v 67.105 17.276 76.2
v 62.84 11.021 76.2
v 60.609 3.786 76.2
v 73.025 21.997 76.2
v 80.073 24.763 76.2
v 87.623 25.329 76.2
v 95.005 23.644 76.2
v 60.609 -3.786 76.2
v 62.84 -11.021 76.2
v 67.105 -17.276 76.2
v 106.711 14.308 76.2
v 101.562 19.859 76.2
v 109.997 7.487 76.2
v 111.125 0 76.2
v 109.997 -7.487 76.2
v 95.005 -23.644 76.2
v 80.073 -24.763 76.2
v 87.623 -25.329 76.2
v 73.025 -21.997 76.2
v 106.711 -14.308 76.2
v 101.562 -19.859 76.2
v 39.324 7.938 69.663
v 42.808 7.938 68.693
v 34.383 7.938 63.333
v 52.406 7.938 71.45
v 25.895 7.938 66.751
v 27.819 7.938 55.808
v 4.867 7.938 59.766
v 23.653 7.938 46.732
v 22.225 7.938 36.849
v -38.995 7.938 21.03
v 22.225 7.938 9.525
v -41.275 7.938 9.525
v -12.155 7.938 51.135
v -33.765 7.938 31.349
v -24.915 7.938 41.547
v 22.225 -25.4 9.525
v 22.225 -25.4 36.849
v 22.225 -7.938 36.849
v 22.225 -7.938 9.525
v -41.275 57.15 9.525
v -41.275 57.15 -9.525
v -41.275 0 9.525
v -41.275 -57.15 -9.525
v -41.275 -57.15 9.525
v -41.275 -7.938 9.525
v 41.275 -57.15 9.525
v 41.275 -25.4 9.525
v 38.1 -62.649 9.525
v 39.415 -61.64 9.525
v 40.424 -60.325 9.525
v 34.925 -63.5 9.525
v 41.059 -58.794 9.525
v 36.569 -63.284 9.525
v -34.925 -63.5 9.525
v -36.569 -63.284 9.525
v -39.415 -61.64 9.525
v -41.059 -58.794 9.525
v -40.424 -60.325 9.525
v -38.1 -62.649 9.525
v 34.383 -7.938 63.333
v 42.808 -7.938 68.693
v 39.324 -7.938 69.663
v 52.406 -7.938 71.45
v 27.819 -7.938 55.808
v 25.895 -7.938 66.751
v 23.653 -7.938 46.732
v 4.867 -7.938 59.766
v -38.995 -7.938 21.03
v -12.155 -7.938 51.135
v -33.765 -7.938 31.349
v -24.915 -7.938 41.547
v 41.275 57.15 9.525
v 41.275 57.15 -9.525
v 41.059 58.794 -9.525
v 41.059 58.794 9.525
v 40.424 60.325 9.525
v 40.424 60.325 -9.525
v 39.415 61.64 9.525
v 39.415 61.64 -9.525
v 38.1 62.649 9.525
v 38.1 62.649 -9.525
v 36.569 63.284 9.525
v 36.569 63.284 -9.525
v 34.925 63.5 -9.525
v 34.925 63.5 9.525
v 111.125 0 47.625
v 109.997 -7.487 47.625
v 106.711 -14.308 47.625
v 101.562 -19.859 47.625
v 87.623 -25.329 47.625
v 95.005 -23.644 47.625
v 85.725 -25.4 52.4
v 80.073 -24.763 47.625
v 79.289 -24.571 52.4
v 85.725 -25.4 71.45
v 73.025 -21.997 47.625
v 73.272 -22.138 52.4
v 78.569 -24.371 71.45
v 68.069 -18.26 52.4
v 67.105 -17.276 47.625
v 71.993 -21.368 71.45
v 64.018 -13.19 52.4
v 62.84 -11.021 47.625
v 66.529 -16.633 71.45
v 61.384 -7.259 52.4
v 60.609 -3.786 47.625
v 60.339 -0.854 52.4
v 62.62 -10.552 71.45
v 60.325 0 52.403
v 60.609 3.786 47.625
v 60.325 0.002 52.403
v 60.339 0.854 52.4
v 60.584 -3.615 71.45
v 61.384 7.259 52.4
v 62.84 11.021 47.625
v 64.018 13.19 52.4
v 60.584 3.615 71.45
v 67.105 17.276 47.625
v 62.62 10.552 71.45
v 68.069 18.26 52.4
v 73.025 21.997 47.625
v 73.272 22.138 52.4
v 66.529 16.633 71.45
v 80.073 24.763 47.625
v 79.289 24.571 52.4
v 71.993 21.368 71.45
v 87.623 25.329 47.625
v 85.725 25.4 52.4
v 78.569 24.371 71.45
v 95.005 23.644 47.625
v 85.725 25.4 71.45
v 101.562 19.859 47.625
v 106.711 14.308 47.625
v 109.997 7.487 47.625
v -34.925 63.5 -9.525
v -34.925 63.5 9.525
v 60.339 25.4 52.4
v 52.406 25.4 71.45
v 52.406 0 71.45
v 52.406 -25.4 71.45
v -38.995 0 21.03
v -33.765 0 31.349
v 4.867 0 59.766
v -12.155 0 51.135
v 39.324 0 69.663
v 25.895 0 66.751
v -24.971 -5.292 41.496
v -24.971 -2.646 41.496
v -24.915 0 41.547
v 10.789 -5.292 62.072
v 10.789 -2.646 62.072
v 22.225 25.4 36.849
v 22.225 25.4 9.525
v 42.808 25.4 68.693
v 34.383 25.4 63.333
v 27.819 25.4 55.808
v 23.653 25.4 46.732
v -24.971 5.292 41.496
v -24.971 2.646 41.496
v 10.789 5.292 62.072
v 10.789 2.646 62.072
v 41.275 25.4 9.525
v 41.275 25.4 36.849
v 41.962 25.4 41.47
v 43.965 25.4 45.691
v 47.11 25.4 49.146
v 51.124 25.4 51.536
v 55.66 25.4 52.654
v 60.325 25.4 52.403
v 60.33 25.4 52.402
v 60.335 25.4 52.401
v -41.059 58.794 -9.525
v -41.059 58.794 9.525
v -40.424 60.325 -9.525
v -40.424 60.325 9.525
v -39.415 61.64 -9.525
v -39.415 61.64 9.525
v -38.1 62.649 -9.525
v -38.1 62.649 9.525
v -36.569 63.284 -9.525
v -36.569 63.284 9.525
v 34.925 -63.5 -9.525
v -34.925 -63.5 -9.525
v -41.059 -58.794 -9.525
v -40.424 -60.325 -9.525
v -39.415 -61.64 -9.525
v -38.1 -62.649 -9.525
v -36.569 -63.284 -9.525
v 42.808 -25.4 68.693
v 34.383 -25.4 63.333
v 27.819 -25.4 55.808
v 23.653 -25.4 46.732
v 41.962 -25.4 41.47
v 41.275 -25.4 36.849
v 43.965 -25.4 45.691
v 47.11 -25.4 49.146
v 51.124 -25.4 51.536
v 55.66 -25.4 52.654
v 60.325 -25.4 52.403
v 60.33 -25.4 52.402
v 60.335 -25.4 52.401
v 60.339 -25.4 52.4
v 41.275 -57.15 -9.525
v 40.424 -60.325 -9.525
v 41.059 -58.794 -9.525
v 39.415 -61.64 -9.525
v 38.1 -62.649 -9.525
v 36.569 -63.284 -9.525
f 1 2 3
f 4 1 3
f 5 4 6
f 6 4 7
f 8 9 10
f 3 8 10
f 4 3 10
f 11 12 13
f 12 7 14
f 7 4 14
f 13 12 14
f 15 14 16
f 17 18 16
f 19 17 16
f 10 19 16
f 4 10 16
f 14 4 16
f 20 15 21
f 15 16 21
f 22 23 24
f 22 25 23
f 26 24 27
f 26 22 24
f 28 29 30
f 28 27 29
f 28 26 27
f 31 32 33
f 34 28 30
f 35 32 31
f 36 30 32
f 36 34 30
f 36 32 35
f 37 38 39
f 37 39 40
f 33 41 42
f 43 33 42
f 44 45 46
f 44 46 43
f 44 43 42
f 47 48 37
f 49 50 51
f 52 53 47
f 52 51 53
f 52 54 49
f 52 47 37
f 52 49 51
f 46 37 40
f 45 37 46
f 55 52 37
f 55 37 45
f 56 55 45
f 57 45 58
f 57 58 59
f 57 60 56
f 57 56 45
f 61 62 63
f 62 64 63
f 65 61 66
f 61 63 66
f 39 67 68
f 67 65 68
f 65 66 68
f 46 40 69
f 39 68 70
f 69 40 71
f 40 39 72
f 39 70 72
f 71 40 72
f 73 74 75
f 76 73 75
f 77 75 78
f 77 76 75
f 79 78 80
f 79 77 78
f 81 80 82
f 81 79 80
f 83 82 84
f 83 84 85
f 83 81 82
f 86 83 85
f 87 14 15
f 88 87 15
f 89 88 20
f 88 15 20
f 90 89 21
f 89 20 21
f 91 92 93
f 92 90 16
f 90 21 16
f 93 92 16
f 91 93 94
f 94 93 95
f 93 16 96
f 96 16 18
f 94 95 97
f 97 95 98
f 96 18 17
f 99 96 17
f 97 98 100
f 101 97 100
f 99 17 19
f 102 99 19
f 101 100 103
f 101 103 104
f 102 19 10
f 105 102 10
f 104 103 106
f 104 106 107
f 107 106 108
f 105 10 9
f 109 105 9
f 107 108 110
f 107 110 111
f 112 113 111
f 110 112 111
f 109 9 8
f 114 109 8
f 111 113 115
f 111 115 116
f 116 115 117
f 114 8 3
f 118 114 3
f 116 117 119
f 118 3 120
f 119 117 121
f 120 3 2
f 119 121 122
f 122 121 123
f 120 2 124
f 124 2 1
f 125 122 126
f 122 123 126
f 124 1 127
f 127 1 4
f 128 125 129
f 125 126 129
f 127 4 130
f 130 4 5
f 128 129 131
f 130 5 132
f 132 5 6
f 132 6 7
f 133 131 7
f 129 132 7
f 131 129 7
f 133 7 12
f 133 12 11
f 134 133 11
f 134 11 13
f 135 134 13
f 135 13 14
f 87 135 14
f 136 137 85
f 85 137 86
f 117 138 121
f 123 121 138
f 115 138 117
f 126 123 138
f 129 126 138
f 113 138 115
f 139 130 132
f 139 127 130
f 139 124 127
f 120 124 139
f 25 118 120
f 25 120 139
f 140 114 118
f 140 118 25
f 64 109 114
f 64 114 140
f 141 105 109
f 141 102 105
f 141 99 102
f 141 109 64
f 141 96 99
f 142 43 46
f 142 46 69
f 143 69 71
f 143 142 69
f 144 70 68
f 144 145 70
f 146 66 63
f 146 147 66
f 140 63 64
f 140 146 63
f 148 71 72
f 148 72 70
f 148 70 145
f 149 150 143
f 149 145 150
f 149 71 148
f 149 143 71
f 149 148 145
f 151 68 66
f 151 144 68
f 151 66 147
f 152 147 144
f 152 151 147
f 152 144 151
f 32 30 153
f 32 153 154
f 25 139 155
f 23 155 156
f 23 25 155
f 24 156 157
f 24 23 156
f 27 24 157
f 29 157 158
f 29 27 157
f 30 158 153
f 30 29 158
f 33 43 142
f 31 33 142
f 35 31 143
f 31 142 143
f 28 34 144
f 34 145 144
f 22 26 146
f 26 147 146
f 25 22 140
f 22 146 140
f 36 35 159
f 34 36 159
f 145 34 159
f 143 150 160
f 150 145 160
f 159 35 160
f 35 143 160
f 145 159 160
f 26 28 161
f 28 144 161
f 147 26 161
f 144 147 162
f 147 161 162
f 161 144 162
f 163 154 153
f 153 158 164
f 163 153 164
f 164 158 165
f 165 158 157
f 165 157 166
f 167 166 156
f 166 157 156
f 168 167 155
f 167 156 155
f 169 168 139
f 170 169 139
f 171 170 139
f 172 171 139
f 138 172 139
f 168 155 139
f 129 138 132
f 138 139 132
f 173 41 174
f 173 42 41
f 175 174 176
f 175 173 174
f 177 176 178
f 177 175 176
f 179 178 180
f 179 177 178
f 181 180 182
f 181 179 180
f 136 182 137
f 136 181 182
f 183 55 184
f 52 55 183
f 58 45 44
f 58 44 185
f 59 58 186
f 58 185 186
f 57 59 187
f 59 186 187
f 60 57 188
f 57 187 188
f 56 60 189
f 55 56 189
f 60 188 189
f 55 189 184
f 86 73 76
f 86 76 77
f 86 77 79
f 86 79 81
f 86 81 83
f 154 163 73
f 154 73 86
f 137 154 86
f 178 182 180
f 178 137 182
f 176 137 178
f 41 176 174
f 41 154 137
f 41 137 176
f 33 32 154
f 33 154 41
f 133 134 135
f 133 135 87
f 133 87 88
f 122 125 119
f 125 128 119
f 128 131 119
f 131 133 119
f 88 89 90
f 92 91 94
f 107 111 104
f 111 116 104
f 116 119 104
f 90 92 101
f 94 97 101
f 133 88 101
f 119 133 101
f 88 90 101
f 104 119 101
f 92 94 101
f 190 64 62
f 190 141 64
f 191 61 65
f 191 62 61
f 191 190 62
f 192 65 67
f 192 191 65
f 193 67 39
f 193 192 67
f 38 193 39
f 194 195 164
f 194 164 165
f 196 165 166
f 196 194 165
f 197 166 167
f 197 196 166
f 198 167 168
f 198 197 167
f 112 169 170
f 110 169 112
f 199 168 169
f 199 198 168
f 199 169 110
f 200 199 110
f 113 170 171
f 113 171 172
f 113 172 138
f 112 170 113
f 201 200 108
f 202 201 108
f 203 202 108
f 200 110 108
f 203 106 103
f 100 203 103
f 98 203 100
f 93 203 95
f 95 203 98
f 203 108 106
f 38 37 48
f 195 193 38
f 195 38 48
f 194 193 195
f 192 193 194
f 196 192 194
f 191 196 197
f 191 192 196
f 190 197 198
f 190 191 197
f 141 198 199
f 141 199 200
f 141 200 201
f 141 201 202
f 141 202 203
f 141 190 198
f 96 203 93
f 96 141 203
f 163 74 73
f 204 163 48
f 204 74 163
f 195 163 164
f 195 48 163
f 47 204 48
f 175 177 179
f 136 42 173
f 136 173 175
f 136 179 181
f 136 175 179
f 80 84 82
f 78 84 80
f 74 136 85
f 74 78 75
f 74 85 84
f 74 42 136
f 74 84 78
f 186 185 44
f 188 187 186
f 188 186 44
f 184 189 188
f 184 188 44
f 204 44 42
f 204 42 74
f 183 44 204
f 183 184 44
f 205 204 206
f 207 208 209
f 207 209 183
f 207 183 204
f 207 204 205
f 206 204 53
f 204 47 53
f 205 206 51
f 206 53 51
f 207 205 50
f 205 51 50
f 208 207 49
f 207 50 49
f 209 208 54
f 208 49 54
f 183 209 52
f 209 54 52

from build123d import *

# Parameters (mm, degrees)
F1_DEPTH = 63.5
F2_DEPTH = 25.4
F3_DEPTH = 7.9375
F4_DEPTH = 25.4
F6_R     = 6.35


with BuildPart() as f1:
    # F0 (on Front) → F1 (new body, symmetric)
    with BuildSketch(Plane.XZ):
        Polygon((-41.275, 9.525), (-41.275, -9.525), (41.275, -9.525), (41.275, 9.525), (22.225, 9.525), align=None)
    extrude(amount=F1_DEPTH, both=True)

    # F0 (on Front) → F2 (join, symmetric)
    with BuildSketch(Plane.XZ):
        with BuildLine():
            Line((22.225, 9.525), (41.275, 9.525))
            Line((41.275, 9.525), (41.275, 36.848876))
            ThreePointArc((41.275, 36.848876), (47.109768, 49.145598), (60.325, 52.403135))
            Line((60.325, 52.403135), (60.325, 71.4502))
            Line((60.325, 71.4502), (52.406165, 71.4502))
            ThreePointArc((52.406165, 71.4502), (30.830482, 59.806197), (22.225, 36.848876))
            Line((22.225, 36.848876), (22.225, 9.525))
        make_face()
    extrude(amount=F2_DEPTH, both=True)

    # F0 (on Front) → F3 (join, symmetric)
    with BuildSketch(Plane.XZ):
        with BuildLine():
            add(Edge.make_bspline(
                [(-41.275, 9.525), (-39.229893, 47.259647), (12.391411, 67.604472), (52.406165, 71.4502)],
                knots=[0, 0, 0, 0, 112.298224, 112.298224, 112.298224, 112.298224], degree=3))
            Line((-41.275, 9.525), (22.225, 9.525))
            Line((22.225, 9.525), (22.225, 36.848876))
            ThreePointArc((22.225, 36.848876), (30.830482, 59.806197), (52.406165, 71.4502))
        make_face()
    extrude(amount=F3_DEPTH, both=True)

    # F0 (on Front) → F4 (join, symmetric)
    with BuildSketch(Plane.XZ):
        with BuildLine():
            Line((85.725, 71.4502), (60.325, 71.4502))
            Line((60.325, 71.4502), (60.325, 52.403135))
            ThreePointArc((60.325, 52.403135), (60.332174, 52.401669), (60.339347, 52.4002))
            Line((60.339347, 52.4002), (85.725, 52.4002))
            Line((85.725, 52.4002), (85.725, 71.4502))
        make_face()
    extrude(amount=F4_DEPTH, both=True)

    # F0 (on Front) → F5 (revolve)
    with BuildSketch(Plane.XZ):
        Polygon((85.725, 76.2), (85.725, 71.4502), (85.725, 52.4002), (85.725, 47.625), (111.125, 47.625), (111.125, 76.2), align=None)
    revolve(axis=Axis((85.725, 0, 59.5376), (0, 0, -1)))

    # F6
    f6_edges = [f1.edges().sort_by_distance(p)[0] for p in [
        (41.275, -63.5, 0),
        (41.275, 63.5, 0),
        (-41.275, -63.5, 0),
        (-41.275, 63.5, 0),
    ]]
    fillet(f6_edges, radius=F6_R)


solid = f1.part
